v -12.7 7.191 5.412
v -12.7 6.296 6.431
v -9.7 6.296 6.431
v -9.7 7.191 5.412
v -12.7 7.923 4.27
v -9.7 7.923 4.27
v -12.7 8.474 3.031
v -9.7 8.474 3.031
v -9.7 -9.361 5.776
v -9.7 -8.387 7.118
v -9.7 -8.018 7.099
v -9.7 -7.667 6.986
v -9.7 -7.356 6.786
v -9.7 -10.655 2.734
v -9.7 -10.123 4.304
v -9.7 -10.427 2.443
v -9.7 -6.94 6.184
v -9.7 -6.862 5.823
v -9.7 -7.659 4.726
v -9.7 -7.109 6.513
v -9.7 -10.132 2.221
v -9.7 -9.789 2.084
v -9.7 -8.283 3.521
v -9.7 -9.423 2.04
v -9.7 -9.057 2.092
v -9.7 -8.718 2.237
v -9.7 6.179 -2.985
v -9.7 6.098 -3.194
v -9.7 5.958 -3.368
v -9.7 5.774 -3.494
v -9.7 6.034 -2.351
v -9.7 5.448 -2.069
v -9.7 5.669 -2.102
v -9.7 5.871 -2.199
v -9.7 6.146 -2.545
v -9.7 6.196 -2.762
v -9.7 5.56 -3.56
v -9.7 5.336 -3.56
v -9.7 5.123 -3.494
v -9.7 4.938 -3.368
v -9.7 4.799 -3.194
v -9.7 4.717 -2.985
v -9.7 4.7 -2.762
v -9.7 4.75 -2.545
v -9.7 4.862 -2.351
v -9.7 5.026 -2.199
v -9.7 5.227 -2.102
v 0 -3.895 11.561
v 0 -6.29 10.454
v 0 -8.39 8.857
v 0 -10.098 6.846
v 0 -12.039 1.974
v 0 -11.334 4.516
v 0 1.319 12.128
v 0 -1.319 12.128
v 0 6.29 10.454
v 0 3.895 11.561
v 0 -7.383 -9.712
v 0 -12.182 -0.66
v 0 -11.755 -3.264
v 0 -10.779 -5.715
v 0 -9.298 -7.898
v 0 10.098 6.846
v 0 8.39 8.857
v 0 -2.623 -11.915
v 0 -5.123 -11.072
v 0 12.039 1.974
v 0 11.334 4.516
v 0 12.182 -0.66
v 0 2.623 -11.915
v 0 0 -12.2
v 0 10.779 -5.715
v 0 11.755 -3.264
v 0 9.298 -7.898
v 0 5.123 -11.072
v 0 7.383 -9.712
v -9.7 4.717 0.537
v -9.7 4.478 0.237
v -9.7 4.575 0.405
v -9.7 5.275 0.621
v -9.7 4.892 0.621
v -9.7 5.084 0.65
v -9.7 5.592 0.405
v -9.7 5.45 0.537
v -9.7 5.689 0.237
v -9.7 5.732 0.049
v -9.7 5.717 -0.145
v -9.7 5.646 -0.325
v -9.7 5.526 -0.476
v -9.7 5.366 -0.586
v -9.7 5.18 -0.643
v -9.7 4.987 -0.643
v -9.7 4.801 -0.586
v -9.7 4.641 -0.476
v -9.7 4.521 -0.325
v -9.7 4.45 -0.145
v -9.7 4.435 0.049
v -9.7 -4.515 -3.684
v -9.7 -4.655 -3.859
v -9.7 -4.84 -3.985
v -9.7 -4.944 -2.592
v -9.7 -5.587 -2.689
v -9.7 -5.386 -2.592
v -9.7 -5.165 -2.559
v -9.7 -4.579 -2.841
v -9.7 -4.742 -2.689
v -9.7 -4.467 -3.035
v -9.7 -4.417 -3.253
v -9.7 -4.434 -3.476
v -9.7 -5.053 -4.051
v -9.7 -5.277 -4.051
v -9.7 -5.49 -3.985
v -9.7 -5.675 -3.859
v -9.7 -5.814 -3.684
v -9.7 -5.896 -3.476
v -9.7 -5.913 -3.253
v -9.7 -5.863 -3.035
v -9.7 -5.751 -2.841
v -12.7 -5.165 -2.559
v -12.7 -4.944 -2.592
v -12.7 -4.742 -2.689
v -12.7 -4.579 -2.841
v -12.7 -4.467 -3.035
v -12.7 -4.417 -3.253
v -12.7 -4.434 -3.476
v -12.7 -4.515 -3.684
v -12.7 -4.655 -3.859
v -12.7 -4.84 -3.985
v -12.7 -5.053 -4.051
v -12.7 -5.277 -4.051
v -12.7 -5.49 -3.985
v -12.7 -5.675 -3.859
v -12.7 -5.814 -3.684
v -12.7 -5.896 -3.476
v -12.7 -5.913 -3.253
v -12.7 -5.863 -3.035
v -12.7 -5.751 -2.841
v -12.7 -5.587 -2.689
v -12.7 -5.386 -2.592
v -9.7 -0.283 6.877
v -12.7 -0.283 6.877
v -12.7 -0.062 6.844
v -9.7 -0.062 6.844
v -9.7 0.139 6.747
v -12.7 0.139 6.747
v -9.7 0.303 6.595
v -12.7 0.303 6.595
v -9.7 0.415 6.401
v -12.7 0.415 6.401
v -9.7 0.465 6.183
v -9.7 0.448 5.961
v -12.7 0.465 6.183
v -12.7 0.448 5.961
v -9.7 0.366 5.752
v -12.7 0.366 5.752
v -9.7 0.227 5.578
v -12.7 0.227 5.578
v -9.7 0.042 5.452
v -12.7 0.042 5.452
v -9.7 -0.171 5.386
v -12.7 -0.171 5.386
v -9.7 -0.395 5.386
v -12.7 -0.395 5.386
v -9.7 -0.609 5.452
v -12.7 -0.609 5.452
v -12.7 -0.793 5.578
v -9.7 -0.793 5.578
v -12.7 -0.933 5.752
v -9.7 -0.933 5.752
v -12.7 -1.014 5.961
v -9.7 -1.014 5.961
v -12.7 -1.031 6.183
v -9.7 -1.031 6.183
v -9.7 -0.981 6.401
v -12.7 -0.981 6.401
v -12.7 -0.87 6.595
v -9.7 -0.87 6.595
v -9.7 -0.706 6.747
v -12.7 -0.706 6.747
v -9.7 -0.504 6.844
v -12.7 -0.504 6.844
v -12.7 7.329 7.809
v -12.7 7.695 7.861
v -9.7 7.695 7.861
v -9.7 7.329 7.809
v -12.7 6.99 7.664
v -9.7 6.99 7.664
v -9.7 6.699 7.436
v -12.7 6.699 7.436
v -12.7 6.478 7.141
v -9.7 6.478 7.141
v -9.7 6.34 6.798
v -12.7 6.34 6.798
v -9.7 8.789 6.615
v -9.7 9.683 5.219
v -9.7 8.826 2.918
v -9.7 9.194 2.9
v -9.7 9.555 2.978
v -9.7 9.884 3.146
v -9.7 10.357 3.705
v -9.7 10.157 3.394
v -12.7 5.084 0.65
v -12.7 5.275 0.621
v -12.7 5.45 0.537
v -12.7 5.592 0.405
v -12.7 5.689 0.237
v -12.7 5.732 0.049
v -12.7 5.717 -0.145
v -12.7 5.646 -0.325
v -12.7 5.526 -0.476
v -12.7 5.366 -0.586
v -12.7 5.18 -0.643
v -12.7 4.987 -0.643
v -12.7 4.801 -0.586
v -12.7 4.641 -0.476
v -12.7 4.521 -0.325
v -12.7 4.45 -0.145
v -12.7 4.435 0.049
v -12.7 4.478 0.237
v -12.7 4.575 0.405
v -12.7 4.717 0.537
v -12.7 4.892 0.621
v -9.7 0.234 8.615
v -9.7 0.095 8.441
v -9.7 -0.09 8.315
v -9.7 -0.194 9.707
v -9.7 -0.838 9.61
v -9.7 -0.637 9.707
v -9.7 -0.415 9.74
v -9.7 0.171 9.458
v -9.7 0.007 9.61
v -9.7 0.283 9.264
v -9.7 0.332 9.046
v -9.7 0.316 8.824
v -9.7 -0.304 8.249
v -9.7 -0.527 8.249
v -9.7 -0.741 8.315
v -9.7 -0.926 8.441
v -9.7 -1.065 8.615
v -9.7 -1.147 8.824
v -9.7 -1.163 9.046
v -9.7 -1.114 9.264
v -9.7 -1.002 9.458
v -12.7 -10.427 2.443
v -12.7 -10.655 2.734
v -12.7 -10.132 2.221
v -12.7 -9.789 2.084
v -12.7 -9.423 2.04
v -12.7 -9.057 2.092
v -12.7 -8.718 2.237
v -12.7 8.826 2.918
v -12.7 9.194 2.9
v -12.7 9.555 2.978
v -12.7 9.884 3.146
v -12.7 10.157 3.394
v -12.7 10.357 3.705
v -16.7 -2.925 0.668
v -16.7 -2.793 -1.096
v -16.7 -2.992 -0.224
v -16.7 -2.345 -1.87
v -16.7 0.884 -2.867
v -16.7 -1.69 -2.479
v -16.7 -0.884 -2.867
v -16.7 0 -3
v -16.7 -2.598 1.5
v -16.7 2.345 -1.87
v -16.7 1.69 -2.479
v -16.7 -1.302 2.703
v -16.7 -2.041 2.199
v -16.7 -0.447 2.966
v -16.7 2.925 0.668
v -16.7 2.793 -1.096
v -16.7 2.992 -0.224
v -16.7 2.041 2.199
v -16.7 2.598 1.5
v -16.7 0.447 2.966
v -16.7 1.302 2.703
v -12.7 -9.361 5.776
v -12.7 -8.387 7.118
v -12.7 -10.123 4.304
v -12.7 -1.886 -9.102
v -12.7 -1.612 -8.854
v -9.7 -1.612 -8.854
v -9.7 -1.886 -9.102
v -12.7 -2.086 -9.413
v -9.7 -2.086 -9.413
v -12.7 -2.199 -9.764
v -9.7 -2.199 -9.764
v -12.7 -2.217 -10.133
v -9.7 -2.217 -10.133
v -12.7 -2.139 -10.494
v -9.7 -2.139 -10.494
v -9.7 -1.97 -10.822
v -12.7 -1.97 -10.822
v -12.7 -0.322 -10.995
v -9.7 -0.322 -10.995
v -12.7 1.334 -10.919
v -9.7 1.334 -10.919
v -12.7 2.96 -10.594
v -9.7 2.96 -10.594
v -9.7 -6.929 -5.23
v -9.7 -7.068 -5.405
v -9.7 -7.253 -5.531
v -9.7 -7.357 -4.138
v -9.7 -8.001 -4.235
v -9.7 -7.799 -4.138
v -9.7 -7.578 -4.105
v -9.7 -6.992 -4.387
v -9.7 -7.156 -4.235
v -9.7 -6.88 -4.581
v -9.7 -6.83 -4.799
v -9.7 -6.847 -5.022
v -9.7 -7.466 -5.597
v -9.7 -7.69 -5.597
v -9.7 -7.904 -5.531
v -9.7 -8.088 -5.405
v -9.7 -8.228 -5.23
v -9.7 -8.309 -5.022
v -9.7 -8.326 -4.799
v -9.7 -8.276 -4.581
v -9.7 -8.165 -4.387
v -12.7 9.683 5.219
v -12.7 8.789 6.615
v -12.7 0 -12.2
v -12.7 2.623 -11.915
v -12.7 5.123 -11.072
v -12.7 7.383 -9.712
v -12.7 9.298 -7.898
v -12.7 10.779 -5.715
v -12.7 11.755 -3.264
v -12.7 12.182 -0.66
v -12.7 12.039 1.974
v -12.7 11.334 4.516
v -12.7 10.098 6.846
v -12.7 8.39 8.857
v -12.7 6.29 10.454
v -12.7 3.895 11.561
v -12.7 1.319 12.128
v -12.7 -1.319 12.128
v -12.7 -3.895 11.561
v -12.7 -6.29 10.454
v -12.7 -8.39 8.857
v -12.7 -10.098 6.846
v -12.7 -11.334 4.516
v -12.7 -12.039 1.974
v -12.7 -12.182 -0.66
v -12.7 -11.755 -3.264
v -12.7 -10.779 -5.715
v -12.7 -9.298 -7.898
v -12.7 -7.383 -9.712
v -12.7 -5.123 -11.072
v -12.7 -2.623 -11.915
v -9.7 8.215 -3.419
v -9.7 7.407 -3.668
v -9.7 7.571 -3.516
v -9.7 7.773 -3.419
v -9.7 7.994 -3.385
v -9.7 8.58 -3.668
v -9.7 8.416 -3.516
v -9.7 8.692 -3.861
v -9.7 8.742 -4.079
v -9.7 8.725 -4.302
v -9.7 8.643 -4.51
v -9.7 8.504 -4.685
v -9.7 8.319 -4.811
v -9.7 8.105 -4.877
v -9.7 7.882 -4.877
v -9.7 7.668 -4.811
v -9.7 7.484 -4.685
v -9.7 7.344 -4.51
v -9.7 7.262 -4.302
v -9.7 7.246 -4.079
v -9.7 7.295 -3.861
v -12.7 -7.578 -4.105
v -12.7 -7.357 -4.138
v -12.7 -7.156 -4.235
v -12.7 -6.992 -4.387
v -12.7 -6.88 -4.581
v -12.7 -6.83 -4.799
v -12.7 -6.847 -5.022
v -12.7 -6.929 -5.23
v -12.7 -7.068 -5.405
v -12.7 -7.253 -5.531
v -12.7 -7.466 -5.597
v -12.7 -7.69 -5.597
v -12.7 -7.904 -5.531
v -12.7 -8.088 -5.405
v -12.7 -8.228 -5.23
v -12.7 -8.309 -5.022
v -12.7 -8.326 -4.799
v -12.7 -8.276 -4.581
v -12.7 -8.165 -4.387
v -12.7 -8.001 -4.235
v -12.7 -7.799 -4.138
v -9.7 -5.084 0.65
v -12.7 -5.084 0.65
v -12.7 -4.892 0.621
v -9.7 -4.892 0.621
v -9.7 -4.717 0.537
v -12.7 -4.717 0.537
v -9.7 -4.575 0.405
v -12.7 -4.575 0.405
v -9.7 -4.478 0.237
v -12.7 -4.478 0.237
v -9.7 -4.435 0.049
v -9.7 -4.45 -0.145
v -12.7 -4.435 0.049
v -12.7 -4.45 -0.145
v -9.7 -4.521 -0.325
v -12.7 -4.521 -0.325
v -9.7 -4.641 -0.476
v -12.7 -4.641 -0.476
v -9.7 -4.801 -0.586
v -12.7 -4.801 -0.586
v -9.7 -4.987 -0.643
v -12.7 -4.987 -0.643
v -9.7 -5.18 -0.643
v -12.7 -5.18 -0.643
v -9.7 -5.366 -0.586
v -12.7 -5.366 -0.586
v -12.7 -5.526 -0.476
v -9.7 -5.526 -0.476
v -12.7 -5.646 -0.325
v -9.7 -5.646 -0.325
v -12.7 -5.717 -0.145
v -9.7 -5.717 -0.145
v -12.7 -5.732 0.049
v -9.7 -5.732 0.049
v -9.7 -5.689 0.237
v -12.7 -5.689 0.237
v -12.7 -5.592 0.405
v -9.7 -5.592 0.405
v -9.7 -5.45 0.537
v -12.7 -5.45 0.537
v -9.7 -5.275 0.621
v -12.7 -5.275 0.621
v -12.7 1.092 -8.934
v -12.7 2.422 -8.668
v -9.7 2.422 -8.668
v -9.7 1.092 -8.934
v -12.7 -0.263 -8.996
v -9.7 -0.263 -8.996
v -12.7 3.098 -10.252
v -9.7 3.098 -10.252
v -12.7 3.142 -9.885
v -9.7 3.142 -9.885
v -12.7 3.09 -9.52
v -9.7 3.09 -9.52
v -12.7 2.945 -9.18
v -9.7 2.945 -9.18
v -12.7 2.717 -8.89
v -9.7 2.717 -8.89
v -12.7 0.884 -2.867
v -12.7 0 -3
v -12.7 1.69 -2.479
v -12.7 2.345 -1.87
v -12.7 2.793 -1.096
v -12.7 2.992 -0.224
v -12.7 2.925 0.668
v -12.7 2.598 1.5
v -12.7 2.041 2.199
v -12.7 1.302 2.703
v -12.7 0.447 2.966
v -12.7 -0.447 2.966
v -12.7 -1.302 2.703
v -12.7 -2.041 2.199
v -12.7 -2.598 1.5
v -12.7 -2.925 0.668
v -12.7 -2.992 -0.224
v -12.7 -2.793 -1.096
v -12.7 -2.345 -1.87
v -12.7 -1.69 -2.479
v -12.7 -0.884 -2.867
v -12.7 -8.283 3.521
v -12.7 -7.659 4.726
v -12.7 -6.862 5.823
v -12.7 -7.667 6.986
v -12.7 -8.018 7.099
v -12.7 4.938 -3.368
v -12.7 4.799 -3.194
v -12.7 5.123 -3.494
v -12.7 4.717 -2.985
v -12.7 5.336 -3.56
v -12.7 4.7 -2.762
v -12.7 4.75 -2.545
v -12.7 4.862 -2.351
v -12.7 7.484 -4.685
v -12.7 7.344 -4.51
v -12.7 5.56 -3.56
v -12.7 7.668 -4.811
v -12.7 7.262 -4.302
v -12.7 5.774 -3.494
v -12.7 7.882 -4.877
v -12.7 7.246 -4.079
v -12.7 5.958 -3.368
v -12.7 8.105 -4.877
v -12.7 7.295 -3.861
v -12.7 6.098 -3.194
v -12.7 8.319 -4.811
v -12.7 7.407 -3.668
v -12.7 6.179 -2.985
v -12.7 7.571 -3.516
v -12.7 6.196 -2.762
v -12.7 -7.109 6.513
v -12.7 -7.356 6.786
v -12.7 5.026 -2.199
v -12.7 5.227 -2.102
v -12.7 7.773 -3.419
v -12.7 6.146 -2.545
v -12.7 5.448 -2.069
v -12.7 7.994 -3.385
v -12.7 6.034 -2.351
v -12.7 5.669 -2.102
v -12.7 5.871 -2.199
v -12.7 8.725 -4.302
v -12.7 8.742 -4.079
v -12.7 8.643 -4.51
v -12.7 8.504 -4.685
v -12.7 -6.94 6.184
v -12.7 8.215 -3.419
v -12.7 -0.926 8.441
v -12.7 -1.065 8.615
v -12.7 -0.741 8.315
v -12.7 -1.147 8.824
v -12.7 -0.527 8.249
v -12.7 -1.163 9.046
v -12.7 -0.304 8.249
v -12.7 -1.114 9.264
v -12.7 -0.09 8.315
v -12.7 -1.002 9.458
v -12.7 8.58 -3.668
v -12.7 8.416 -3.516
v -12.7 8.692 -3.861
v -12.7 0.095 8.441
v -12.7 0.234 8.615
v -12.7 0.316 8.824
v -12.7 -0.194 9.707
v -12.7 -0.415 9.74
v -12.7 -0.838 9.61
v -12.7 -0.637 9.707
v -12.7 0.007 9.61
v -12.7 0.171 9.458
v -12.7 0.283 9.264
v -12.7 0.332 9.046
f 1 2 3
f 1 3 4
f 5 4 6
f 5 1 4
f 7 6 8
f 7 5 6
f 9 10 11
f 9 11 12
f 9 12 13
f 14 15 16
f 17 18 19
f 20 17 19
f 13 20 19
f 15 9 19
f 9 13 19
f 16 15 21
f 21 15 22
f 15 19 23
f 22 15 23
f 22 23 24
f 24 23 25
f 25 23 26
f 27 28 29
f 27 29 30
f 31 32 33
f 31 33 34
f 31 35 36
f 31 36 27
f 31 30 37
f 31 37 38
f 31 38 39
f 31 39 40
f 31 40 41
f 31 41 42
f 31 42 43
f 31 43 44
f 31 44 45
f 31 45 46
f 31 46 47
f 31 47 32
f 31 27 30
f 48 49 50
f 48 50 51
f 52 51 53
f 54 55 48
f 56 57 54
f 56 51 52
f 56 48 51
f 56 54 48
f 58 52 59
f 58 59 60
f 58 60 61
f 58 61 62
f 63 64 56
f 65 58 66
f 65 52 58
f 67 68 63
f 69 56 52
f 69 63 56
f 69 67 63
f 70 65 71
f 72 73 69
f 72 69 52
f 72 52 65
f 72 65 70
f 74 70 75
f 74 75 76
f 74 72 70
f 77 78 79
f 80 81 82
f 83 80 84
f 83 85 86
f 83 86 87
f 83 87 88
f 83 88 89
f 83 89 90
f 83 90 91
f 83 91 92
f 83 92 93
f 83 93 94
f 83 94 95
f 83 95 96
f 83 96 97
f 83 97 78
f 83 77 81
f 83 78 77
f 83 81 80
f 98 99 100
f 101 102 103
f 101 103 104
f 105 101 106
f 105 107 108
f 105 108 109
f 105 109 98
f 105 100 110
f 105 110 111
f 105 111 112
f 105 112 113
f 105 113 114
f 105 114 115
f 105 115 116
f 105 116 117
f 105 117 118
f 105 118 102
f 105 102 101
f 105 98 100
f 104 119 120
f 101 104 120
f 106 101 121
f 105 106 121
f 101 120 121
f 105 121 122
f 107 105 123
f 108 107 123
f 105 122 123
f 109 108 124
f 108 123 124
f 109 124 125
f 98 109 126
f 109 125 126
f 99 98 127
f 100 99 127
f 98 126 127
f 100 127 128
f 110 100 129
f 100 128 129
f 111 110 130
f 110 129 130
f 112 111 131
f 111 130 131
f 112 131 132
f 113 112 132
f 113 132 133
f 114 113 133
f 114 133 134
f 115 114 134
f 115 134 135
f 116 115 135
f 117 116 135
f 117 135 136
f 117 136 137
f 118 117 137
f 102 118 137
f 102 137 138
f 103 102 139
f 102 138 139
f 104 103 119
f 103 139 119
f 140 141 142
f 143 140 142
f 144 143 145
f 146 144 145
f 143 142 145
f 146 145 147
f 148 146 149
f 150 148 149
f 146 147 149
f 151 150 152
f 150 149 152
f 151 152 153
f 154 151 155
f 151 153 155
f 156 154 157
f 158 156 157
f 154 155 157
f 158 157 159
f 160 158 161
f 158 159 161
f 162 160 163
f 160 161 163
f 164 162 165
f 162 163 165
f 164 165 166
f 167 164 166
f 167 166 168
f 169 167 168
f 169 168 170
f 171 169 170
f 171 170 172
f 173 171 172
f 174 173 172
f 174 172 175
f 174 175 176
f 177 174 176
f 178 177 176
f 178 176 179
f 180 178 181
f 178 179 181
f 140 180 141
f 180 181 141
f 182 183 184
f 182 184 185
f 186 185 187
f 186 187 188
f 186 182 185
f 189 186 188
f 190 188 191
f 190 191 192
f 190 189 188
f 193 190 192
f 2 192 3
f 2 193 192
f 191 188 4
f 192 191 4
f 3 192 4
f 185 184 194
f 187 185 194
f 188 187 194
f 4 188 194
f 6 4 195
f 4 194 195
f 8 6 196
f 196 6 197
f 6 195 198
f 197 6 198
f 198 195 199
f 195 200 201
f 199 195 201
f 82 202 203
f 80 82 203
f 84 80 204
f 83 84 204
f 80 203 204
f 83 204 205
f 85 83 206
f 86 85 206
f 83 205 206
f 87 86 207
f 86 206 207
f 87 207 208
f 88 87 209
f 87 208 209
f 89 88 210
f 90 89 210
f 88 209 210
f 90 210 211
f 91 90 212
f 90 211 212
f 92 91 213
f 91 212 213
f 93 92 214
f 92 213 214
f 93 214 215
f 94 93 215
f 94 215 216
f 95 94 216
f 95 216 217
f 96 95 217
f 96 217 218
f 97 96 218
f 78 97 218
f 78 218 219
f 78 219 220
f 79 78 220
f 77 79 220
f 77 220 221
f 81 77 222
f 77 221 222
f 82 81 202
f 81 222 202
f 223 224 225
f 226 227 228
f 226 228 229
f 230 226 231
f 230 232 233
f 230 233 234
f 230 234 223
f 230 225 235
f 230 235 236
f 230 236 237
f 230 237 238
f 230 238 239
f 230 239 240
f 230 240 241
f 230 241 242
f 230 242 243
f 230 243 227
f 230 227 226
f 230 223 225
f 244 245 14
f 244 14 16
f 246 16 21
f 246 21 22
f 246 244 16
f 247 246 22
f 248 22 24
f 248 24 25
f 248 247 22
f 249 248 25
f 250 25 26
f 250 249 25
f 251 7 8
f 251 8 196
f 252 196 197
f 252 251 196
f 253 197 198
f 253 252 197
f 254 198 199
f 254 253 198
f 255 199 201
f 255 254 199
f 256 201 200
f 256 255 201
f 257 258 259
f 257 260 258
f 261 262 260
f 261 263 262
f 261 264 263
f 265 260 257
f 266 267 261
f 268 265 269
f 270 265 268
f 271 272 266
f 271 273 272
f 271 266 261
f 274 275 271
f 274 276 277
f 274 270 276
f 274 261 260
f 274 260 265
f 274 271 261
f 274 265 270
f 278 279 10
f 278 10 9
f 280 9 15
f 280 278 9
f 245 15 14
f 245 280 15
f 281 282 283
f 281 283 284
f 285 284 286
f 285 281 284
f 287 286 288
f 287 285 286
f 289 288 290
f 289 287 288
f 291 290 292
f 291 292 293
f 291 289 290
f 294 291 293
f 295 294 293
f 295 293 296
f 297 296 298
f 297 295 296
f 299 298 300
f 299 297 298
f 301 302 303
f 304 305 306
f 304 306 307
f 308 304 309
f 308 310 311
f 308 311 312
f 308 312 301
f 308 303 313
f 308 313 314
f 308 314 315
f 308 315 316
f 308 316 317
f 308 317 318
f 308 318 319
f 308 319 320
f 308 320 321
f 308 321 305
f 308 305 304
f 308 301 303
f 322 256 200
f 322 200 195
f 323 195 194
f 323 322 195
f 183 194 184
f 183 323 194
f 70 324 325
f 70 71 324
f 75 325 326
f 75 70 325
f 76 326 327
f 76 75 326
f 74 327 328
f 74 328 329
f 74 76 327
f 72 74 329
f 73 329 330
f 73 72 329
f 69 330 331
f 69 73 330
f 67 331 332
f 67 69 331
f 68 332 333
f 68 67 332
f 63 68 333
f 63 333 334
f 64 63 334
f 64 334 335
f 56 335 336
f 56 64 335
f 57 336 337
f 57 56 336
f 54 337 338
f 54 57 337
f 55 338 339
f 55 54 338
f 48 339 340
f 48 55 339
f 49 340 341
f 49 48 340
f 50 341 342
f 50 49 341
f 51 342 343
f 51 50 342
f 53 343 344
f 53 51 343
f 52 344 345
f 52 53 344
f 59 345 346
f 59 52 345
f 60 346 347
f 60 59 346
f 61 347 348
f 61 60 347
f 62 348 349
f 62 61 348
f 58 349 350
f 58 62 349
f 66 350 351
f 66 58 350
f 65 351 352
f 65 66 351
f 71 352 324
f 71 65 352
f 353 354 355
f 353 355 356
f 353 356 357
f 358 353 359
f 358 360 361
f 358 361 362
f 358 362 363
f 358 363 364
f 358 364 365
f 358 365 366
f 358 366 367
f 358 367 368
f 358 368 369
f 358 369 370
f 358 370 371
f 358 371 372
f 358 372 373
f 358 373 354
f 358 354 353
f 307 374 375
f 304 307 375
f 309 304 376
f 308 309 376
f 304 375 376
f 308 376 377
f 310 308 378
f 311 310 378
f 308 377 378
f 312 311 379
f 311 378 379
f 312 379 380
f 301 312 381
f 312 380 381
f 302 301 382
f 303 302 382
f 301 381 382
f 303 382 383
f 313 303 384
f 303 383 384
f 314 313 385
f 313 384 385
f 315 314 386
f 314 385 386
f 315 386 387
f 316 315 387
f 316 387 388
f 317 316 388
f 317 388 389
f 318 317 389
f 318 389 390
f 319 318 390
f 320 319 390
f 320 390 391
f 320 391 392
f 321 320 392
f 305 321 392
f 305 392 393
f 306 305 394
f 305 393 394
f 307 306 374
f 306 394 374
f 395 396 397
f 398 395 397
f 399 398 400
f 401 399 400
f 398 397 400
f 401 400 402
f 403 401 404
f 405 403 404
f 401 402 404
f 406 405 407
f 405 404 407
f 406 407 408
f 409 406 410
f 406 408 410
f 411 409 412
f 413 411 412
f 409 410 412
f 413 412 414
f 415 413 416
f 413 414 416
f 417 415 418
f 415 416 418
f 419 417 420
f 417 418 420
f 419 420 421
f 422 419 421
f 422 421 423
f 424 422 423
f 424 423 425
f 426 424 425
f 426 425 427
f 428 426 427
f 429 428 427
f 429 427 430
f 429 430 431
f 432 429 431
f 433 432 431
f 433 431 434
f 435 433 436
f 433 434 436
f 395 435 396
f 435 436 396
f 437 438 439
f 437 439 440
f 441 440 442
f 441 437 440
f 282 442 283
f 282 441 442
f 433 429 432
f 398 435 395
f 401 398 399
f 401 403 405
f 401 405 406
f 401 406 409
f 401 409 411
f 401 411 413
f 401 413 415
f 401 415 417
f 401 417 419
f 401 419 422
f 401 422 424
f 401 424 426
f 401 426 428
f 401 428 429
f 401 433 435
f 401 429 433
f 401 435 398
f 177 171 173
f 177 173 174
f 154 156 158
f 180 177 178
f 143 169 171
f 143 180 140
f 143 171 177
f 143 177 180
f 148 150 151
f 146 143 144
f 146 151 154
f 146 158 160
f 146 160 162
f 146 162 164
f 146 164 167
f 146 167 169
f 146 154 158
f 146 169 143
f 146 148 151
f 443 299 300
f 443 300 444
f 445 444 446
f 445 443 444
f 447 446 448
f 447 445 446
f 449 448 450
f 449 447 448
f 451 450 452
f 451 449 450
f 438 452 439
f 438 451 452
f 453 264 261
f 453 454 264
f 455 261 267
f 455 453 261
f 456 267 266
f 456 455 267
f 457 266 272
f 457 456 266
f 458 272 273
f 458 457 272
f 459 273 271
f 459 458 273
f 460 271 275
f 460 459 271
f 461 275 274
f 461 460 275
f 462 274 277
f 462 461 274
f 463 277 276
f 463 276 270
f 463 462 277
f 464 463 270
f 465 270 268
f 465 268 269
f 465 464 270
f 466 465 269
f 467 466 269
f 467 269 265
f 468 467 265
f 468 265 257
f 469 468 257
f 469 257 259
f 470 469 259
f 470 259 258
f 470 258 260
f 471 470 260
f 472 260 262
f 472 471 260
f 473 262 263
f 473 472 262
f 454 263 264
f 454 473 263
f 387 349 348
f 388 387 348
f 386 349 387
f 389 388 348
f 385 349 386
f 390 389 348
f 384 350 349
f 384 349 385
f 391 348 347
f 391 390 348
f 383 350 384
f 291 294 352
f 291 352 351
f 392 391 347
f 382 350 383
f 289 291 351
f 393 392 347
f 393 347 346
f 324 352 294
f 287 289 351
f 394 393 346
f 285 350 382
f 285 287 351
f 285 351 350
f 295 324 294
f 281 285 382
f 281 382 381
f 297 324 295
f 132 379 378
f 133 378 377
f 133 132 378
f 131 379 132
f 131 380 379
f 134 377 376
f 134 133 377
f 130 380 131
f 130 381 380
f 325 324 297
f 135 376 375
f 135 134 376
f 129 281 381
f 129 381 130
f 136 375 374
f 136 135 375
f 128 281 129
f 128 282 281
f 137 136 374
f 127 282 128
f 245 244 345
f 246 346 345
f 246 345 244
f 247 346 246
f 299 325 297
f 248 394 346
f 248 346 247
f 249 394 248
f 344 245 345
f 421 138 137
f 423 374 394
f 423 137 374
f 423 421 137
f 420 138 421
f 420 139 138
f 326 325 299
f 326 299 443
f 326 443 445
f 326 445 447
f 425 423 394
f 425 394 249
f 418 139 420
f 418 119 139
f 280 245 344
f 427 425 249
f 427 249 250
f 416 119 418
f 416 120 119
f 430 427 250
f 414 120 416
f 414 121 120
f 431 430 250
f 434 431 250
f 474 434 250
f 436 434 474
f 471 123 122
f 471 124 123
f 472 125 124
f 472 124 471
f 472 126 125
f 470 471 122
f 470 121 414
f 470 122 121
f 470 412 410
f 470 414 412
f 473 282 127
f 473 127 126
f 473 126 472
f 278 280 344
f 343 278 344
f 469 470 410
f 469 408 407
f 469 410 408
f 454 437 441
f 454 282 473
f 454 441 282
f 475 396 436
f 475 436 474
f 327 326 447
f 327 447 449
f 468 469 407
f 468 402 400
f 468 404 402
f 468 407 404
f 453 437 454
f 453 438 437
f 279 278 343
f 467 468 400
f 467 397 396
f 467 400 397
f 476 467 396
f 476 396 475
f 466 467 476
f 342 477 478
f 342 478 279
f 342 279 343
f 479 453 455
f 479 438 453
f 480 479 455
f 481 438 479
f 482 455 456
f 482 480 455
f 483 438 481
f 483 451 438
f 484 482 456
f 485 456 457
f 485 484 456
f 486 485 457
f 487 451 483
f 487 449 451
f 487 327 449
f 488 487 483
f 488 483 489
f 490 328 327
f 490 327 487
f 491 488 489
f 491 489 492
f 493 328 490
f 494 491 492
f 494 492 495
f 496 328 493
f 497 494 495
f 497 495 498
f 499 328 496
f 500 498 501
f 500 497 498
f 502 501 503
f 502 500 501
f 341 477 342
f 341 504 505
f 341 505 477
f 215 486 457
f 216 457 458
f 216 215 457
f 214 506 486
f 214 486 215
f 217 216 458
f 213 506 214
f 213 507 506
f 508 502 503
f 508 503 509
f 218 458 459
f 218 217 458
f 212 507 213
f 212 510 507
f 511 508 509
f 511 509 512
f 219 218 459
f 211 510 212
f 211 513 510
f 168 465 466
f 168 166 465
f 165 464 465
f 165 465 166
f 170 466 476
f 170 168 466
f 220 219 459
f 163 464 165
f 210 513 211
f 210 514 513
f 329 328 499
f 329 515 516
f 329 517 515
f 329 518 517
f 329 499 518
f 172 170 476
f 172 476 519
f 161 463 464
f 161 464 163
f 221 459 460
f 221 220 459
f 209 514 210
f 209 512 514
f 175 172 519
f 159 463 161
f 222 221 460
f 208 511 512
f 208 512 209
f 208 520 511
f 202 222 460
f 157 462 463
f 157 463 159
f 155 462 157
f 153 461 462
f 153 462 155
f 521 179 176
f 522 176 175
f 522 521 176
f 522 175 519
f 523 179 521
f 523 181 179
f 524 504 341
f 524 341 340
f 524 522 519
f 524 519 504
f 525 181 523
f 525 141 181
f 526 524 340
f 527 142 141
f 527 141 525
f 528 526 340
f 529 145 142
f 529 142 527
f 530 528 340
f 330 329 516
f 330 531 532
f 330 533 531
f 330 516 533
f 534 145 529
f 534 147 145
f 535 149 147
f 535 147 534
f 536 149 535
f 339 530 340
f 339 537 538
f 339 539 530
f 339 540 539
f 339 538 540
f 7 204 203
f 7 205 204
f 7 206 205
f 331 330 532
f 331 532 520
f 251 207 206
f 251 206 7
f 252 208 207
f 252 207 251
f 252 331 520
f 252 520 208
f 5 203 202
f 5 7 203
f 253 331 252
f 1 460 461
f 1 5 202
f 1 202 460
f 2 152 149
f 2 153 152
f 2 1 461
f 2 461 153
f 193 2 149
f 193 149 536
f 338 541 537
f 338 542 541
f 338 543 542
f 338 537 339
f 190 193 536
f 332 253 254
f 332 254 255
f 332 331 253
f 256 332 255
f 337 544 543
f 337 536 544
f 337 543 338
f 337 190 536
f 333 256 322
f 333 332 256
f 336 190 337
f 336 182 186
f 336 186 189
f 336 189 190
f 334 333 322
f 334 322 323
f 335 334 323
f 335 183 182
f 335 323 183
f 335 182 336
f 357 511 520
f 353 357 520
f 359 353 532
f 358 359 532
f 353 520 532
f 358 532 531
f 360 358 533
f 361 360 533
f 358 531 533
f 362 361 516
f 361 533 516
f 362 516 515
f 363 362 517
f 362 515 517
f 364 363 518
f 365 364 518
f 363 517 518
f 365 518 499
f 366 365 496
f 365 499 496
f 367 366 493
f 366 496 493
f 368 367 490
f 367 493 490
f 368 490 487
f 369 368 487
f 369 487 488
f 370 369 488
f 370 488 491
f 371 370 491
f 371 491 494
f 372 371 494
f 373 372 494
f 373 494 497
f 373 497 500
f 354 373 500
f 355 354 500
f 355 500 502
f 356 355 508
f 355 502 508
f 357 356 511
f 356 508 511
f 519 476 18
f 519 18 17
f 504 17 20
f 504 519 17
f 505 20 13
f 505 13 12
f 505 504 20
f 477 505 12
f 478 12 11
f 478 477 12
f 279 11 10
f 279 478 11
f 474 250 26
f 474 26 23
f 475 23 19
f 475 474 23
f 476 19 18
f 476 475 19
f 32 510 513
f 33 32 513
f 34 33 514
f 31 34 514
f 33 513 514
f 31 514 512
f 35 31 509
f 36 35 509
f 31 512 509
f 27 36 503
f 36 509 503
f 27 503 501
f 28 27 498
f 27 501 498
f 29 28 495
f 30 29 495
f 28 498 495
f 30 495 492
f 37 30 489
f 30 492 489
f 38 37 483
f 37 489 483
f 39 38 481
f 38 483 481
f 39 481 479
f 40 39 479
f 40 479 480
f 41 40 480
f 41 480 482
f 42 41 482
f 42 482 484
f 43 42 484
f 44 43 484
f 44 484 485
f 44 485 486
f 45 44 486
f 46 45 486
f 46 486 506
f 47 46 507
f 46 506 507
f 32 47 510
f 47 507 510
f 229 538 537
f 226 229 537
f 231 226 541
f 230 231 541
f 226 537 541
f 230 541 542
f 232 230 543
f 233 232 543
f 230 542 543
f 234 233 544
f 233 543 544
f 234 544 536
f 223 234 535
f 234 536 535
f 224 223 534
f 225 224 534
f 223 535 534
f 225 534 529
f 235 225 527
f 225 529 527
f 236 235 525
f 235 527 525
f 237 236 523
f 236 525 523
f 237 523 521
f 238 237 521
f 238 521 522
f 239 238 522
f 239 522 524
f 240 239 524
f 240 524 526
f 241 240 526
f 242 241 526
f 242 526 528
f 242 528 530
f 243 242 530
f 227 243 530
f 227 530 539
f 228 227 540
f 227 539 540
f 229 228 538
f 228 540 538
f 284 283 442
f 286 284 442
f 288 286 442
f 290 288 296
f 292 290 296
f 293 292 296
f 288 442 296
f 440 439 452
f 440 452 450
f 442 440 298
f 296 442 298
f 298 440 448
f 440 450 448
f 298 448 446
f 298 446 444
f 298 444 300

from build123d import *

# Parameters (mm, degrees)
CUT_EXTRUDE_1_DEPTH = 3
SKETCH_4_R          = 0.75
CUT_EXTRUDE_2_DEPTH = 3
SKETCH_6_R          = 0.65
CUT_EXTRUDE_3_DEPTH = 3


with BuildPart() as part:
    # 草图1 → 旋转1 (revolve)
    with BuildSketch(Plane(origin=(0, 0, 0), x_dir=(1, 0, 0), z_dir=(0, 1, 0))):
        Polygon((0, 0), (-16.7, 0), (-16.7, 3), (-12.7, 3), (-12.7, 12.2), (0, 12.2), align=None)
    revolve(axis=Axis((-159.613189405, 0, 0), (1, 0, 0)))

    # 草图3 → 切除-拉伸1 (cut)
    with BuildSketch(Plane.ZY.offset(12.7)):
        with BuildLine():
            ThreePointArc((-8.667998766, 2.421940832), (-8.99040601, 0.415451281), (-8.854419452, -1.612220883))
            ThreePointArc((-8.854419452, -1.612220883), (-9.764043418, -2.198869939), (-10.822068219, -1.97049219))
            ThreePointArc((-10.822068219, -1.97049219), (-10.988274013, 0.507773788), (-10.594220714, 2.960149905))
            ThreePointArc((-10.594220714, 2.960149905), (-9.519642991, 3.089978996), (-8.667998766, 2.421940832))
        make_face()
        with BuildLine():
            ThreePointArc((6.43146167, 6.295736716), (4.854994369, 7.578194355), (3.030985485, 8.474262622))
            ThreePointArc((3.030985485, 8.474262622), (2.977744482, 9.555344613), (3.704537815, 10.357432094))
            ThreePointArc((3.704537815, 10.357432094), (5.933882006, 9.262237545), (7.860675374, 7.694789319))
            ThreePointArc((7.860675374, 7.694789319), (7.435821803, 6.699263167), (6.43146167, 6.295736716))
        make_face()
        with BuildLine():
            ThreePointArc((2.236537096, -8.717677547), (4.135411642, -7.993645636), (5.823433967, -6.862041739))
            ThreePointArc((5.823433967, -6.862041739), (6.786298936, -7.356474674), (7.117530404, -8.386939904))
            ThreePointArc((7.117530404, -8.386939904), (5.054392007, -9.770011333), (2.73354534, -10.654939224))
            ThreePointArc((2.73354534, -10.654939224), (2.083821188, -9.789242163), (2.236537096, -8.717677547))
        make_face()
    extrude(amount=-CUT_EXTRUDE_1_DEPTH, mode=Mode.SUBTRACT)

    # 草图4 → 切除-拉伸2 (cut)
    with BuildSketch(Plane.ZY.offset(12.7)):
        with Locations((-2.818506641, 5.448101727)):
            Circle(SKETCH_4_R)
        with Locations((-4.135411642, 7.993645636)):
            Circle(SKETCH_4_R)
        with Locations((8.99040601, -0.415451281)):
            Circle(SKETCH_4_R)
        with Locations((6.127447818, -0.283152512)):
            Circle(SKETCH_4_R)
        with Locations((-4.854994369, -7.578194355)):
            Circle(SKETCH_4_R)
        with Locations((-3.308941178, -5.164949215)):
            Circle(SKETCH_4_R)
    extrude(amount=-CUT_EXTRUDE_2_DEPTH, mode=Mode.SUBTRACT)

    # 草图6 → 切除-拉伸3 (cut)
    with BuildSketch(Plane.ZY.offset(12.7)):
        with Locations((0, 5.083503848)):
            Circle(SKETCH_6_R)
        with Locations((0, -5.083503848)):
            Circle(SKETCH_6_R)
    extrude(amount=-CUT_EXTRUDE_3_DEPTH, mode=Mode.SUBTRACT)


solid = part.part
